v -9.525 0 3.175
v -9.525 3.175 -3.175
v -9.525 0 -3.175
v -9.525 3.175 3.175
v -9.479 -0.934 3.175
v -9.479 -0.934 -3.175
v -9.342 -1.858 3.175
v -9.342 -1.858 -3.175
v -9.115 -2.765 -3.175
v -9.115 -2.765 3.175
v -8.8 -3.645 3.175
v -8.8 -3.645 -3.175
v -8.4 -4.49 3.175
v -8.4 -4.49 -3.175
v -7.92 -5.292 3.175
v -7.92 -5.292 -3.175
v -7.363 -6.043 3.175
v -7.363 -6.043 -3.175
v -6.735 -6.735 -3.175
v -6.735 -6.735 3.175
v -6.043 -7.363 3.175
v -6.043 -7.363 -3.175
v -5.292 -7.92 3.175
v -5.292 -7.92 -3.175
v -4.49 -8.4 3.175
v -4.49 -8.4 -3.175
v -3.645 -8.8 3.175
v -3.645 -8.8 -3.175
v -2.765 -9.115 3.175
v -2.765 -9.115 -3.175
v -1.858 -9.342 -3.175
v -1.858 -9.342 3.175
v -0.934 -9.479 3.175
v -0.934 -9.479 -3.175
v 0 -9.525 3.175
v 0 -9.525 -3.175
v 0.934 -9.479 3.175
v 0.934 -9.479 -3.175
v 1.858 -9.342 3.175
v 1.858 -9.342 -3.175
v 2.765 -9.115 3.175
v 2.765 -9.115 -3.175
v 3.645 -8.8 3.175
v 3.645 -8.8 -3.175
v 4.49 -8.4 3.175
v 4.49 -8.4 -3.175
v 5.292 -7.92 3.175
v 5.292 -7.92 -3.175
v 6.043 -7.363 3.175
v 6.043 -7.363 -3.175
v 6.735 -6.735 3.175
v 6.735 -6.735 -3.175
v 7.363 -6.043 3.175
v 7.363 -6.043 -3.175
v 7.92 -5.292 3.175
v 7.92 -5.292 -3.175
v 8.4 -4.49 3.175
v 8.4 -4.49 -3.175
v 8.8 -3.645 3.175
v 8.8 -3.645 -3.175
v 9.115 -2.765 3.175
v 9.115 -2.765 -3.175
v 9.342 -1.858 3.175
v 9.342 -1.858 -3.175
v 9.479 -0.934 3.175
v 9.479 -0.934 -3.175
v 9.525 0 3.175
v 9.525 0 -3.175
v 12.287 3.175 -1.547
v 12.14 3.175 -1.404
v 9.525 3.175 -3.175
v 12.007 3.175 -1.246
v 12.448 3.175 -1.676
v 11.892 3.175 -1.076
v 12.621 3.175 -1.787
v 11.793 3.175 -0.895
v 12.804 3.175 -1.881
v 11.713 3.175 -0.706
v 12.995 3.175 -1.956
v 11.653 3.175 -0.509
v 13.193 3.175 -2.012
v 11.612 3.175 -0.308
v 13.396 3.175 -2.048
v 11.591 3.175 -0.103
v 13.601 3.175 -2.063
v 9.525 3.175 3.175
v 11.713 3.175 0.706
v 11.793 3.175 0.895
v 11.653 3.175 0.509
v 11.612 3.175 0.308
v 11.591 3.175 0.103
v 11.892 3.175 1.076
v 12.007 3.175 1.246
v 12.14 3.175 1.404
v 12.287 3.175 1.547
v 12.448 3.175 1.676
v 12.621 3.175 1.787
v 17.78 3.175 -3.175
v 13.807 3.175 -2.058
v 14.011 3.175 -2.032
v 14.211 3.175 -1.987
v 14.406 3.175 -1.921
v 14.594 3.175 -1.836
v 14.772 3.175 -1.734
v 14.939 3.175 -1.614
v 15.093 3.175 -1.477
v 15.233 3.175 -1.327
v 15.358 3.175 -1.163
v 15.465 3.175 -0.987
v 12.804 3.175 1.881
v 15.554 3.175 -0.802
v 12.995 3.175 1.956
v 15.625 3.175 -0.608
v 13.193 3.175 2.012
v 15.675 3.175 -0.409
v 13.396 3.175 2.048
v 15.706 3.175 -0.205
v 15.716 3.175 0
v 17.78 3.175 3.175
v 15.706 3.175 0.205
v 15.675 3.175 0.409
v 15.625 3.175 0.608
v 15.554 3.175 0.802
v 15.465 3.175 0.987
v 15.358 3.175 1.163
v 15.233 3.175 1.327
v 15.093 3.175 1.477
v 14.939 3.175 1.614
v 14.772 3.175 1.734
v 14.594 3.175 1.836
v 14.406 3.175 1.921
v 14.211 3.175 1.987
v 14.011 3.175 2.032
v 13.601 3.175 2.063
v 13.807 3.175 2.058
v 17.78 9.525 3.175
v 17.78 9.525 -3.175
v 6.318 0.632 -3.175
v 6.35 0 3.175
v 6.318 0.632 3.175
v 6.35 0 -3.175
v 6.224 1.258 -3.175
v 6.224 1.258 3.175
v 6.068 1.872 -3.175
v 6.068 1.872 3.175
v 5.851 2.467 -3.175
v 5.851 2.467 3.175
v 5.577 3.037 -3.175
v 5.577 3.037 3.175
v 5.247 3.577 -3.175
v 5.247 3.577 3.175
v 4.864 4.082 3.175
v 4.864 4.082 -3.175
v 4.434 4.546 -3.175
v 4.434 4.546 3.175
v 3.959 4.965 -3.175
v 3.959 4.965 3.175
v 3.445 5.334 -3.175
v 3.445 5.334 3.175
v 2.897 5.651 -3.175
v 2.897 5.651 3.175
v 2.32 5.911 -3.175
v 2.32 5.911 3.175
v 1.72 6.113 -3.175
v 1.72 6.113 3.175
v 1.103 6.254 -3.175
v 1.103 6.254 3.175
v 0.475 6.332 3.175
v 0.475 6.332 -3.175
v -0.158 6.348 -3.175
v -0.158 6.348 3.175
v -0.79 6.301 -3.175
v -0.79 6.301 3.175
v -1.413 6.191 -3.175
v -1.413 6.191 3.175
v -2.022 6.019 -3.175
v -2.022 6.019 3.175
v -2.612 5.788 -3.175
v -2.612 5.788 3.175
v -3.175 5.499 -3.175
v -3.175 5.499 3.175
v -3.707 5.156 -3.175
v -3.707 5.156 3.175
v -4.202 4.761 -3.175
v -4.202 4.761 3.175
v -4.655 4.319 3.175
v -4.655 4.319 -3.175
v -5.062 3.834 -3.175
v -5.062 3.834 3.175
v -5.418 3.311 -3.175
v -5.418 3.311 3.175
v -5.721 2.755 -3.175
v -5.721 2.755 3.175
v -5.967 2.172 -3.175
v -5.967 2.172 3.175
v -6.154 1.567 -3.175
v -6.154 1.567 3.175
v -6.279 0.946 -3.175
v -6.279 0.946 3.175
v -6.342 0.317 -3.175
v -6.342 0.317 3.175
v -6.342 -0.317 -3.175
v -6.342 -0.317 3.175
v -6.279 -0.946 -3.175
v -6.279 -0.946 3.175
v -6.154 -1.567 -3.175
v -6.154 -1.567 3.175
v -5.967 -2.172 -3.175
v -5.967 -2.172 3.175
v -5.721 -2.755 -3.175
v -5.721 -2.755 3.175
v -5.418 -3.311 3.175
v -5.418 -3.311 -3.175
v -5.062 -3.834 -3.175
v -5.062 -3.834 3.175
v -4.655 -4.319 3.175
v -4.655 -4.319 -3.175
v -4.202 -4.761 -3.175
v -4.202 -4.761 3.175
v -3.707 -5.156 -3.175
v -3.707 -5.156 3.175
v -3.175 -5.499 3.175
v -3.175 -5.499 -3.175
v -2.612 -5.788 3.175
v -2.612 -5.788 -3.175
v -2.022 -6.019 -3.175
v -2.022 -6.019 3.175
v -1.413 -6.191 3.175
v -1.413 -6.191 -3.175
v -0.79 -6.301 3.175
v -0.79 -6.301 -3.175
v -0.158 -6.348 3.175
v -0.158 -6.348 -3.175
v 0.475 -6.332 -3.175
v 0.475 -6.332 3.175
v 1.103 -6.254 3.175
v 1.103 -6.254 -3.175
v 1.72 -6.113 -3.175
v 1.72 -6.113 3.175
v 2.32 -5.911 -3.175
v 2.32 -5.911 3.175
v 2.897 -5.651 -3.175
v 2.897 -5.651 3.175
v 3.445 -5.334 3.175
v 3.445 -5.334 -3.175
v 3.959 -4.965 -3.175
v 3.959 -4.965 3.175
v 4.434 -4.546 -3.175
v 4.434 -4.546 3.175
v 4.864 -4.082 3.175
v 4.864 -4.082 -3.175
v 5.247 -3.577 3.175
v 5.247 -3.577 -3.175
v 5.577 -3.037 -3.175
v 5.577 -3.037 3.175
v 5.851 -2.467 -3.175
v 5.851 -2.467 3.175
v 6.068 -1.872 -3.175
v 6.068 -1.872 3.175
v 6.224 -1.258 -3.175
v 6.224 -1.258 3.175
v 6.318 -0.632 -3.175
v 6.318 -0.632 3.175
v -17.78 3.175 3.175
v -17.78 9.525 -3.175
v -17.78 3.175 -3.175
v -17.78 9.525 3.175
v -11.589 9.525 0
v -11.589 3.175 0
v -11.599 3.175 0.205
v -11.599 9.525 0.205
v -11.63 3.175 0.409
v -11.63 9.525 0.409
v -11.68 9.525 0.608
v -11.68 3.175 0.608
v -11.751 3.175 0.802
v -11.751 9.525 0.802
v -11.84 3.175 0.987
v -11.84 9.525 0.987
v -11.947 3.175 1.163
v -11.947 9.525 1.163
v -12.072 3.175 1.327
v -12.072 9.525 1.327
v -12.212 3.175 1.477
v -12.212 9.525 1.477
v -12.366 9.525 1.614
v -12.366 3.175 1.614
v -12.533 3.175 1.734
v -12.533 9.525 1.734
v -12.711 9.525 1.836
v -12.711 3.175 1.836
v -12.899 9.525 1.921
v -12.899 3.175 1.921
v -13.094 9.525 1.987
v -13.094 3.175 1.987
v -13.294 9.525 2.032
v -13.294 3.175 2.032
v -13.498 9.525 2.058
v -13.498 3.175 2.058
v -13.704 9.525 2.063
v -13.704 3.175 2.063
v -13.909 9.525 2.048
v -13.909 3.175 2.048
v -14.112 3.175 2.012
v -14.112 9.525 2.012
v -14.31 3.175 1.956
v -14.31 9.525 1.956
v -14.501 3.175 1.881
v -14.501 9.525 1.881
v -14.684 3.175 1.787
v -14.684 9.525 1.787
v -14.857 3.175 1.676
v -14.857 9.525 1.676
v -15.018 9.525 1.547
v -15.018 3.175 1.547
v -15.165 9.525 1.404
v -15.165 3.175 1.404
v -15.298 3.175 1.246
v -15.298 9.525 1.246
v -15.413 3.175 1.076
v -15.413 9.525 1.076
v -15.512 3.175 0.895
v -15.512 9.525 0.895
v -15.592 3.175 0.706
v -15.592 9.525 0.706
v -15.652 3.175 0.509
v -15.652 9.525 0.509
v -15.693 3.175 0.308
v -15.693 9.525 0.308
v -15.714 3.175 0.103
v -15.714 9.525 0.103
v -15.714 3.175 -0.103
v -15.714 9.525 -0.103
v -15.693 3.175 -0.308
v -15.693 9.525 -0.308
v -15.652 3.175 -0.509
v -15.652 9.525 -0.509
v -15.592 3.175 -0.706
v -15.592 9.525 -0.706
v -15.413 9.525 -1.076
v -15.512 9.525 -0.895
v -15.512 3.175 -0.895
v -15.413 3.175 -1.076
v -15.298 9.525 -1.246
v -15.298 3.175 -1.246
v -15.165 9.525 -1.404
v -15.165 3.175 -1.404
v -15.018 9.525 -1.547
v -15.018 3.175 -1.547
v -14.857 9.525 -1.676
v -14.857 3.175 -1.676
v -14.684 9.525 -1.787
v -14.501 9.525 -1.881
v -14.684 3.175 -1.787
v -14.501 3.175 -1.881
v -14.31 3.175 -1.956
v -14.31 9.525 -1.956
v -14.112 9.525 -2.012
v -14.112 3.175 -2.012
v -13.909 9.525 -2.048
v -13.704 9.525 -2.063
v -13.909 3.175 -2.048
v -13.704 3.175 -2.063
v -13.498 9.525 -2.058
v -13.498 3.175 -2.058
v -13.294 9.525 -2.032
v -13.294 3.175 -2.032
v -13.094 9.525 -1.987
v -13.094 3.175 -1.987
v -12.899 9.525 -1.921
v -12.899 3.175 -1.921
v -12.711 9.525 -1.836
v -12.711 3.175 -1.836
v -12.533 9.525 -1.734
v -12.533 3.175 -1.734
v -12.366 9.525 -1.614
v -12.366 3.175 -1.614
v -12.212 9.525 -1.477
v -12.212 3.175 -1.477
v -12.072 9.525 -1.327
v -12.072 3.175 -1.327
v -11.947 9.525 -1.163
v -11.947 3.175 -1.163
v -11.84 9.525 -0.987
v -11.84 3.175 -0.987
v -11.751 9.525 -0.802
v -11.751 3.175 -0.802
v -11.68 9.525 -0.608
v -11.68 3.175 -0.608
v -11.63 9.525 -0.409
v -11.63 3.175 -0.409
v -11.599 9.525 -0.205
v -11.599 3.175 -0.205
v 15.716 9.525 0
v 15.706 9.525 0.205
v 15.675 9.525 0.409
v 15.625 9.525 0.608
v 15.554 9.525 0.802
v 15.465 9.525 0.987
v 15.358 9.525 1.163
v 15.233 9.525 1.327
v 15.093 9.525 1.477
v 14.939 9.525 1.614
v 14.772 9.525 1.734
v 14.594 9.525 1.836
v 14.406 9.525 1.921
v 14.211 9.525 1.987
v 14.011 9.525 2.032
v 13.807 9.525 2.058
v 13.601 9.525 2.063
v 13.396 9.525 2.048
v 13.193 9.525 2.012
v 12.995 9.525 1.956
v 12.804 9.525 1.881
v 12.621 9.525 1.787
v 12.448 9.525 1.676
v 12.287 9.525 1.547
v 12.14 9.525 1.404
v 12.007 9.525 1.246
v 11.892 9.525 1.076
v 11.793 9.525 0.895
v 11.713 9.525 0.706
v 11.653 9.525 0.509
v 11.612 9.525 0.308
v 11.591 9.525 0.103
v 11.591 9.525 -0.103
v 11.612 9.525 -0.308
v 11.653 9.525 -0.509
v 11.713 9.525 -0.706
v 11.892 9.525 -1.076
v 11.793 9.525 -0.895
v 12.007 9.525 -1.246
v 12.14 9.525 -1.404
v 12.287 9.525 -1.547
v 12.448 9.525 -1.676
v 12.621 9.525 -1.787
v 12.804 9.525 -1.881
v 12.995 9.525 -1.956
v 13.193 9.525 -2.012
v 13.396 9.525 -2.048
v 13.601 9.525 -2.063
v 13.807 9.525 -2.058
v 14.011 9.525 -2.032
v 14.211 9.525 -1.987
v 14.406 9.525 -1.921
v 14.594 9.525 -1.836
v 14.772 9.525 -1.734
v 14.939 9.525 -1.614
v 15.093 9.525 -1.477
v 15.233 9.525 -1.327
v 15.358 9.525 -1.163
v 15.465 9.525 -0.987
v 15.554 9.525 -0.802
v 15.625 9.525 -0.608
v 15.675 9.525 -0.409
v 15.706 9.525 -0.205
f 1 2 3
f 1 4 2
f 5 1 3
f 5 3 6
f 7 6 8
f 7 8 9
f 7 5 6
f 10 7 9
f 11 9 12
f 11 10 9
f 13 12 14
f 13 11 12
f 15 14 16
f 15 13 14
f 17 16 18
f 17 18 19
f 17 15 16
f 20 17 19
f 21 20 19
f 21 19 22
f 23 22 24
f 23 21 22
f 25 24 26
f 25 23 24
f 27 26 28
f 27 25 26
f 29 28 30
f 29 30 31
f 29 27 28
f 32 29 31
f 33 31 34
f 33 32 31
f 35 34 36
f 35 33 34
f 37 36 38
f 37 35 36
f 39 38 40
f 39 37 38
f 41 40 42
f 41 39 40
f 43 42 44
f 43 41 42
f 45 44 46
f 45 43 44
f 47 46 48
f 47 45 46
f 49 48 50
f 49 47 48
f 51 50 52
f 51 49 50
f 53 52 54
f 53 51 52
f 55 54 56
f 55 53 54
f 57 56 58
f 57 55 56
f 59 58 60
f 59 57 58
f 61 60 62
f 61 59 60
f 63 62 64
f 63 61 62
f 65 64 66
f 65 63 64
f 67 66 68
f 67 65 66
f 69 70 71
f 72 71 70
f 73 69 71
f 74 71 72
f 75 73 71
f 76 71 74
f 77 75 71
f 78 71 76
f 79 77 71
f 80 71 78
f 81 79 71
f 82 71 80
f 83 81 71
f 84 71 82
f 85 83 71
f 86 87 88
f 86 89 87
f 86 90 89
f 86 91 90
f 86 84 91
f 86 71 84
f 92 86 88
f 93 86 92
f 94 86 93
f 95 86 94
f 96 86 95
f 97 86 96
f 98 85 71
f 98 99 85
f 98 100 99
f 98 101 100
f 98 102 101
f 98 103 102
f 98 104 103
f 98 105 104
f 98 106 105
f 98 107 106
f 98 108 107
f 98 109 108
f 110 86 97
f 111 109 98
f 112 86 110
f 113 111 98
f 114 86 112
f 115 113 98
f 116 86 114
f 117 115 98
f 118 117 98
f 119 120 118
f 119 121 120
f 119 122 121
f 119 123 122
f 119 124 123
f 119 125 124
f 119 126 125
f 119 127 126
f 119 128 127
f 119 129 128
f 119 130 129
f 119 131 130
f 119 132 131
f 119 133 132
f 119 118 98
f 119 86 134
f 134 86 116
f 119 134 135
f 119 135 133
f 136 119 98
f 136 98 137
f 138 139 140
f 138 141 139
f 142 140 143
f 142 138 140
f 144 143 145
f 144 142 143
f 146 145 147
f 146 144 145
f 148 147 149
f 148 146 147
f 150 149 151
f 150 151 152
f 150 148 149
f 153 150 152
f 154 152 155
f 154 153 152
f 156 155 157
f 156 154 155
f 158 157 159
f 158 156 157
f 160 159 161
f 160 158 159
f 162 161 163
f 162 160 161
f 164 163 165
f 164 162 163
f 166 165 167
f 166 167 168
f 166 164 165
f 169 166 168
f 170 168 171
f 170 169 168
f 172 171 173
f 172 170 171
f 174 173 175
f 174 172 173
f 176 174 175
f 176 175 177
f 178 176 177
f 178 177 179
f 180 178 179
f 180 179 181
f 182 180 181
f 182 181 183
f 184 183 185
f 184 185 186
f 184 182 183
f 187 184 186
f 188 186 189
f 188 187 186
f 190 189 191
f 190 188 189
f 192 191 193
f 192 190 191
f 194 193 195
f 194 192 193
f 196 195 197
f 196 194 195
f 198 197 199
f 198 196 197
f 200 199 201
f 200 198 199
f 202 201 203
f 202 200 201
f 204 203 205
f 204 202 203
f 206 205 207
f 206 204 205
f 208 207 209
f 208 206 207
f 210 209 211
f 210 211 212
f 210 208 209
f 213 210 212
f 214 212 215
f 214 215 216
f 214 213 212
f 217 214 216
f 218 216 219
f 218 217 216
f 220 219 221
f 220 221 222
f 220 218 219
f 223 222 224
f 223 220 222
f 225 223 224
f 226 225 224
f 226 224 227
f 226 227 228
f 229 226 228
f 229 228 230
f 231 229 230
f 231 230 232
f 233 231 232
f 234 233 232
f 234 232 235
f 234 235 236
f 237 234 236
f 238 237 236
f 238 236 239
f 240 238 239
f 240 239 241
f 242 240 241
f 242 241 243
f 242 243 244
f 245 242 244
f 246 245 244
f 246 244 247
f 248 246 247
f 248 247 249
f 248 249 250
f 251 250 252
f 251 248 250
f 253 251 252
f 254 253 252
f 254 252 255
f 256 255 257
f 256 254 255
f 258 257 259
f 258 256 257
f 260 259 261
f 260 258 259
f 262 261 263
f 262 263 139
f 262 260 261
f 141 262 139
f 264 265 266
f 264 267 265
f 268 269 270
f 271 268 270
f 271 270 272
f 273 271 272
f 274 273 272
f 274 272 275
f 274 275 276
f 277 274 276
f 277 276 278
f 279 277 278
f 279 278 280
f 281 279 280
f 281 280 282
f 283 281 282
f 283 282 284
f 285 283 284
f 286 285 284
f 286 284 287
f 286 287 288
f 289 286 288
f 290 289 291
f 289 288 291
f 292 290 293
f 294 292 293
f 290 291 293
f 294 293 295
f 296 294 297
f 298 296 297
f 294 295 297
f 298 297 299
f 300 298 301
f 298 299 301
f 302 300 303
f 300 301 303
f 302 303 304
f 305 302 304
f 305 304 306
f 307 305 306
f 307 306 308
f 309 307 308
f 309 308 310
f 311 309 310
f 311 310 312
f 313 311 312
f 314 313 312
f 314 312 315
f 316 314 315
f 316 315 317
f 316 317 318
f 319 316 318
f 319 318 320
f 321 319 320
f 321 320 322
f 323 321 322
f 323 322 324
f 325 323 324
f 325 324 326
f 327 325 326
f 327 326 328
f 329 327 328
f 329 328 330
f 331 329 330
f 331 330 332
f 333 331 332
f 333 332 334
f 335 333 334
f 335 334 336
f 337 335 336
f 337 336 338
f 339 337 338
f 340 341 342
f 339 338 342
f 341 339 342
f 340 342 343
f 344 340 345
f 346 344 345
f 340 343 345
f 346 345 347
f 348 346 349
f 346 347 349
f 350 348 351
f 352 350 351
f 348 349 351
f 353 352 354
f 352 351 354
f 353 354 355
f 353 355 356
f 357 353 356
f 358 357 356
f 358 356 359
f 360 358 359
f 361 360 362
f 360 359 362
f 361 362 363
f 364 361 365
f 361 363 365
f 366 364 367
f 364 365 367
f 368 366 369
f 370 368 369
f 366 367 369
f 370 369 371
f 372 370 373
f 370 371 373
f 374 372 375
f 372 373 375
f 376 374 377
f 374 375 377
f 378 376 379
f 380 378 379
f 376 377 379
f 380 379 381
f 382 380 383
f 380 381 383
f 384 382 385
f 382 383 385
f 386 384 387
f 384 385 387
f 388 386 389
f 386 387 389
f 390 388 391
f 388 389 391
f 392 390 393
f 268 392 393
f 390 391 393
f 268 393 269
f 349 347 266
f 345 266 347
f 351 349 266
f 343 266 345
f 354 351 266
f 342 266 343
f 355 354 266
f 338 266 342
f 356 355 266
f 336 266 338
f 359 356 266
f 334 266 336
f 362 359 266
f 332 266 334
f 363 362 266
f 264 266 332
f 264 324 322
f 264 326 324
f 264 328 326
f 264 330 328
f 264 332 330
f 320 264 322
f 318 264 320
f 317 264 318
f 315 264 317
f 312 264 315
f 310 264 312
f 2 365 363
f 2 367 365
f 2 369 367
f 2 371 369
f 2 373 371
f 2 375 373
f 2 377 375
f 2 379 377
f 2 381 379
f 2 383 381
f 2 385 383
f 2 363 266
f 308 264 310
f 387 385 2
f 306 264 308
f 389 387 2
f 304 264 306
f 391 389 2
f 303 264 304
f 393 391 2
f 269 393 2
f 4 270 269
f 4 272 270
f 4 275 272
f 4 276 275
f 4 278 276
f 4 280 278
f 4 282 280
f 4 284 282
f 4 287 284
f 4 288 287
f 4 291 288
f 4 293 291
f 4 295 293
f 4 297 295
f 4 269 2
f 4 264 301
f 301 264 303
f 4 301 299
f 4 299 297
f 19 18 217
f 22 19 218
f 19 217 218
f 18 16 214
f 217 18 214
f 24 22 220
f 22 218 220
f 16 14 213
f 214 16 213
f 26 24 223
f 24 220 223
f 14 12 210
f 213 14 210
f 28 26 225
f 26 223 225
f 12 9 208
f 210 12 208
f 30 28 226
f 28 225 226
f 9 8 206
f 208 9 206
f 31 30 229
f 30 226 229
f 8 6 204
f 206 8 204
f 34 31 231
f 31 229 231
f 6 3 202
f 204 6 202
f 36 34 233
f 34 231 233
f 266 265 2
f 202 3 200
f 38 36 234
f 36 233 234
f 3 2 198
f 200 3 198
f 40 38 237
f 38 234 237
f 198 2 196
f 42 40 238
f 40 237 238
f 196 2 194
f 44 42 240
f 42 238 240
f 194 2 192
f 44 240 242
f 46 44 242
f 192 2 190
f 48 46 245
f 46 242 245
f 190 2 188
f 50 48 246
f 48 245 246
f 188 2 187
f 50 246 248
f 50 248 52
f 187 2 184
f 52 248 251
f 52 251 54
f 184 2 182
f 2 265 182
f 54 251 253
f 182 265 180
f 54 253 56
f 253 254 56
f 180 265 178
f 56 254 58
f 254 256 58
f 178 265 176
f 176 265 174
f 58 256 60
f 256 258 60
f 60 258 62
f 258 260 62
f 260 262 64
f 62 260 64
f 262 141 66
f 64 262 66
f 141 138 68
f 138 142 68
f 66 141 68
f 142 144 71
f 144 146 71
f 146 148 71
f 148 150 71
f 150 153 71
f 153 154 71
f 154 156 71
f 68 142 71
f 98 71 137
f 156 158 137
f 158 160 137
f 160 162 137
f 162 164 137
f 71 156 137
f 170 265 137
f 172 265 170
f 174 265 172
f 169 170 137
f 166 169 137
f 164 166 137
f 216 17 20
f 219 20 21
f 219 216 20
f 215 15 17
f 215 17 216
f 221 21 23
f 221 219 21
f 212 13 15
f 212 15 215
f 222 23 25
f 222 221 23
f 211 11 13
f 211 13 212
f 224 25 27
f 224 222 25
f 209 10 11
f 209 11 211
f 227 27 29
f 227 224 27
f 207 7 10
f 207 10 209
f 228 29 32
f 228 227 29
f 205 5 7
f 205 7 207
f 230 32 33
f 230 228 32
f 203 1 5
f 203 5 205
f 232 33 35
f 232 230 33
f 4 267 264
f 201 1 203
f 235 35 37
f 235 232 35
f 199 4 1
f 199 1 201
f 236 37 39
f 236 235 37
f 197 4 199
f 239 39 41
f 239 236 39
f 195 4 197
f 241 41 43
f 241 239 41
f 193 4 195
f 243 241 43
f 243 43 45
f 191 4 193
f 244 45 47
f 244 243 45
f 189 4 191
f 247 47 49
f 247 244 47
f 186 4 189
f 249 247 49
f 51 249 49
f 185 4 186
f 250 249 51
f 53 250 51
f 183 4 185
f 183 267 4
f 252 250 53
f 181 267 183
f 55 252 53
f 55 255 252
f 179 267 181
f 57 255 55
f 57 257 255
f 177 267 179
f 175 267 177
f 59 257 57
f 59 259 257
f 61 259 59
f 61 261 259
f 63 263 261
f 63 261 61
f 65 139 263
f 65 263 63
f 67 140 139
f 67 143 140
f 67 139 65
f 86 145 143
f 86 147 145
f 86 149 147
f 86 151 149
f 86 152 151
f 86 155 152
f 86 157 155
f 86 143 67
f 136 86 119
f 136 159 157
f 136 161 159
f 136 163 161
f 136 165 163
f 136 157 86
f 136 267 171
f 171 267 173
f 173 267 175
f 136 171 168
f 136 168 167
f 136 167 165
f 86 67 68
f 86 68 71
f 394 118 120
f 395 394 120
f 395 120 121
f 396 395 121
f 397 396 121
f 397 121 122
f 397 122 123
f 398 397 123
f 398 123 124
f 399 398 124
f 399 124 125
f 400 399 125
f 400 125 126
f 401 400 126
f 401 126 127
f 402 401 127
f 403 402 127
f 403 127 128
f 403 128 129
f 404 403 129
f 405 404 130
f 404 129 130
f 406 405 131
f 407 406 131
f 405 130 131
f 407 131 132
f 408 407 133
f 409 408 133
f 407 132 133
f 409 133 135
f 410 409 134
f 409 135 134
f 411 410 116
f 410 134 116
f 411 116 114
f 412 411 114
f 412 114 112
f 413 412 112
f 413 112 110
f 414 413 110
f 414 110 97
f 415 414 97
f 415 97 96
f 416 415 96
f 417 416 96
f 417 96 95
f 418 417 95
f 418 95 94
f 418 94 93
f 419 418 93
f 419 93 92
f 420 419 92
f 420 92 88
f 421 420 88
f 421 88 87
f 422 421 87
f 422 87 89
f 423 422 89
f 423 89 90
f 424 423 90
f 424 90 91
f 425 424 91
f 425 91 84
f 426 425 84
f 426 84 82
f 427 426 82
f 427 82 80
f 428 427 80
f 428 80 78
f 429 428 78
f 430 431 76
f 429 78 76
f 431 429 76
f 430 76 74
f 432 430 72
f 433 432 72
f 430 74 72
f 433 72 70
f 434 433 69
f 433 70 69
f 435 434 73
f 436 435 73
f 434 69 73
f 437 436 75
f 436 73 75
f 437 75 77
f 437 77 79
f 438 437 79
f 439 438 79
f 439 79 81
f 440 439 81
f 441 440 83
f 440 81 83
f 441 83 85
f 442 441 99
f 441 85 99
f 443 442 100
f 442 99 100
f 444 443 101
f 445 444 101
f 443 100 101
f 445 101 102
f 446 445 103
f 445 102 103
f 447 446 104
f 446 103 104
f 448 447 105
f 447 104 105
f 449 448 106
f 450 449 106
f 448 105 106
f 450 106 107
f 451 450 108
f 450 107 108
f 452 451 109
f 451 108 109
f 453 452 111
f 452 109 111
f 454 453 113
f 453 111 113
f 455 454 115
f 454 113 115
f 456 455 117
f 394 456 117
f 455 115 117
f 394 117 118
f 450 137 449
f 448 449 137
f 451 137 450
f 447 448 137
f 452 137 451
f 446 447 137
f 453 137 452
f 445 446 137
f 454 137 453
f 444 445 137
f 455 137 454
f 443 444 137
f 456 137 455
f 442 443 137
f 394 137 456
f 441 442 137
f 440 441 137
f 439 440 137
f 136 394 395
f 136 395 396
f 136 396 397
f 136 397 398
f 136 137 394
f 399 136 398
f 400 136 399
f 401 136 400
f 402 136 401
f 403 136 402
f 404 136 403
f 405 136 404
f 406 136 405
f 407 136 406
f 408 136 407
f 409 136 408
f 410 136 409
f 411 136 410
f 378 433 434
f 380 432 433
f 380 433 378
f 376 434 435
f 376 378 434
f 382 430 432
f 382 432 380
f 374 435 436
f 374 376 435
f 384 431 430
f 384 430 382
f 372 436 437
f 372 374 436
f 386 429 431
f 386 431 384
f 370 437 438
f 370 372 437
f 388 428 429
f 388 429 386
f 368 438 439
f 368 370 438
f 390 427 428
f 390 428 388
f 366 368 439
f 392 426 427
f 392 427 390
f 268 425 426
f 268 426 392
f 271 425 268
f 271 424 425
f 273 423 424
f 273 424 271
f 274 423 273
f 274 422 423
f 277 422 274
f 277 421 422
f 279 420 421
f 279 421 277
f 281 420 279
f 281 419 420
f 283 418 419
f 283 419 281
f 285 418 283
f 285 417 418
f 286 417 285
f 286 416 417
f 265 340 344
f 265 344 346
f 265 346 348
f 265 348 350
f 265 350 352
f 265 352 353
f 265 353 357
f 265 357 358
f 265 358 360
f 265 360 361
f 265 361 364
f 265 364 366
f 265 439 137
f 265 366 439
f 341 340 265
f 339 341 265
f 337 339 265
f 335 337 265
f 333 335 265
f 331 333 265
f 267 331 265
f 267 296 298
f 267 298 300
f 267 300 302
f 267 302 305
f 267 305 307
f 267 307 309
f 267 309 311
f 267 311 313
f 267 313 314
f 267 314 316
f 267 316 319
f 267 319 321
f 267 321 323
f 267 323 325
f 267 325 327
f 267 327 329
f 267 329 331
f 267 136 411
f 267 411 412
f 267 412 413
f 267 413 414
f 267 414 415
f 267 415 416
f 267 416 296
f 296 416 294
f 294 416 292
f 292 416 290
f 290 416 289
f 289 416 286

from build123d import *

# Parameters (mm, degrees)
F0_R     = 6.35
F1_DEPTH = 3.175
F2_R     = 2.06375
F3_DEPTH = 6.351
F4_R     = 2.06375
F5_DEPTH = 6.351


with BuildPart() as f1:
    # F0 (on Top) → F1 (new body, symmetric)
    with BuildSketch(Plane.XY):
        with BuildLine():
            Line((-9.525, 3.175), (-9.525, 0))
            ThreePointArc((-9.525, 0), (0, -9.525), (9.525, 0))
            Line((9.525, 0), (9.525, 3.175))
            Line((9.525, 3.175), (17.78, 3.175))
            Line((17.78, 3.175), (17.78, 9.525))
            Line((17.78, 9.525), (-17.78, 9.525))
            Line((-17.78, 9.525), (-17.78, 3.175))
            Line((-17.78, 3.175), (-9.525, 3.175))
        make_face()
        Circle(F0_R, mode=Mode.SUBTRACT)
    extrude(amount=F1_DEPTH, both=True)

    # F2 (on face) → F3 (cut, through all)
    with BuildSketch(Plane.XZ.offset(-3.175)):
        with Locations((-13.6525, 0)):
            Circle(F2_R)
    extrude(amount=-F3_DEPTH, mode=Mode.SUBTRACT)

    # F4 (on face) → F5 (cut, through all)
    with BuildSketch(Plane.XZ.offset(-3.175)):
        with Locations((13.6525, 0)):
            Circle(F4_R)
    extrude(amount=-F5_DEPTH, mode=Mode.SUBTRACT)


solid = f1.part
